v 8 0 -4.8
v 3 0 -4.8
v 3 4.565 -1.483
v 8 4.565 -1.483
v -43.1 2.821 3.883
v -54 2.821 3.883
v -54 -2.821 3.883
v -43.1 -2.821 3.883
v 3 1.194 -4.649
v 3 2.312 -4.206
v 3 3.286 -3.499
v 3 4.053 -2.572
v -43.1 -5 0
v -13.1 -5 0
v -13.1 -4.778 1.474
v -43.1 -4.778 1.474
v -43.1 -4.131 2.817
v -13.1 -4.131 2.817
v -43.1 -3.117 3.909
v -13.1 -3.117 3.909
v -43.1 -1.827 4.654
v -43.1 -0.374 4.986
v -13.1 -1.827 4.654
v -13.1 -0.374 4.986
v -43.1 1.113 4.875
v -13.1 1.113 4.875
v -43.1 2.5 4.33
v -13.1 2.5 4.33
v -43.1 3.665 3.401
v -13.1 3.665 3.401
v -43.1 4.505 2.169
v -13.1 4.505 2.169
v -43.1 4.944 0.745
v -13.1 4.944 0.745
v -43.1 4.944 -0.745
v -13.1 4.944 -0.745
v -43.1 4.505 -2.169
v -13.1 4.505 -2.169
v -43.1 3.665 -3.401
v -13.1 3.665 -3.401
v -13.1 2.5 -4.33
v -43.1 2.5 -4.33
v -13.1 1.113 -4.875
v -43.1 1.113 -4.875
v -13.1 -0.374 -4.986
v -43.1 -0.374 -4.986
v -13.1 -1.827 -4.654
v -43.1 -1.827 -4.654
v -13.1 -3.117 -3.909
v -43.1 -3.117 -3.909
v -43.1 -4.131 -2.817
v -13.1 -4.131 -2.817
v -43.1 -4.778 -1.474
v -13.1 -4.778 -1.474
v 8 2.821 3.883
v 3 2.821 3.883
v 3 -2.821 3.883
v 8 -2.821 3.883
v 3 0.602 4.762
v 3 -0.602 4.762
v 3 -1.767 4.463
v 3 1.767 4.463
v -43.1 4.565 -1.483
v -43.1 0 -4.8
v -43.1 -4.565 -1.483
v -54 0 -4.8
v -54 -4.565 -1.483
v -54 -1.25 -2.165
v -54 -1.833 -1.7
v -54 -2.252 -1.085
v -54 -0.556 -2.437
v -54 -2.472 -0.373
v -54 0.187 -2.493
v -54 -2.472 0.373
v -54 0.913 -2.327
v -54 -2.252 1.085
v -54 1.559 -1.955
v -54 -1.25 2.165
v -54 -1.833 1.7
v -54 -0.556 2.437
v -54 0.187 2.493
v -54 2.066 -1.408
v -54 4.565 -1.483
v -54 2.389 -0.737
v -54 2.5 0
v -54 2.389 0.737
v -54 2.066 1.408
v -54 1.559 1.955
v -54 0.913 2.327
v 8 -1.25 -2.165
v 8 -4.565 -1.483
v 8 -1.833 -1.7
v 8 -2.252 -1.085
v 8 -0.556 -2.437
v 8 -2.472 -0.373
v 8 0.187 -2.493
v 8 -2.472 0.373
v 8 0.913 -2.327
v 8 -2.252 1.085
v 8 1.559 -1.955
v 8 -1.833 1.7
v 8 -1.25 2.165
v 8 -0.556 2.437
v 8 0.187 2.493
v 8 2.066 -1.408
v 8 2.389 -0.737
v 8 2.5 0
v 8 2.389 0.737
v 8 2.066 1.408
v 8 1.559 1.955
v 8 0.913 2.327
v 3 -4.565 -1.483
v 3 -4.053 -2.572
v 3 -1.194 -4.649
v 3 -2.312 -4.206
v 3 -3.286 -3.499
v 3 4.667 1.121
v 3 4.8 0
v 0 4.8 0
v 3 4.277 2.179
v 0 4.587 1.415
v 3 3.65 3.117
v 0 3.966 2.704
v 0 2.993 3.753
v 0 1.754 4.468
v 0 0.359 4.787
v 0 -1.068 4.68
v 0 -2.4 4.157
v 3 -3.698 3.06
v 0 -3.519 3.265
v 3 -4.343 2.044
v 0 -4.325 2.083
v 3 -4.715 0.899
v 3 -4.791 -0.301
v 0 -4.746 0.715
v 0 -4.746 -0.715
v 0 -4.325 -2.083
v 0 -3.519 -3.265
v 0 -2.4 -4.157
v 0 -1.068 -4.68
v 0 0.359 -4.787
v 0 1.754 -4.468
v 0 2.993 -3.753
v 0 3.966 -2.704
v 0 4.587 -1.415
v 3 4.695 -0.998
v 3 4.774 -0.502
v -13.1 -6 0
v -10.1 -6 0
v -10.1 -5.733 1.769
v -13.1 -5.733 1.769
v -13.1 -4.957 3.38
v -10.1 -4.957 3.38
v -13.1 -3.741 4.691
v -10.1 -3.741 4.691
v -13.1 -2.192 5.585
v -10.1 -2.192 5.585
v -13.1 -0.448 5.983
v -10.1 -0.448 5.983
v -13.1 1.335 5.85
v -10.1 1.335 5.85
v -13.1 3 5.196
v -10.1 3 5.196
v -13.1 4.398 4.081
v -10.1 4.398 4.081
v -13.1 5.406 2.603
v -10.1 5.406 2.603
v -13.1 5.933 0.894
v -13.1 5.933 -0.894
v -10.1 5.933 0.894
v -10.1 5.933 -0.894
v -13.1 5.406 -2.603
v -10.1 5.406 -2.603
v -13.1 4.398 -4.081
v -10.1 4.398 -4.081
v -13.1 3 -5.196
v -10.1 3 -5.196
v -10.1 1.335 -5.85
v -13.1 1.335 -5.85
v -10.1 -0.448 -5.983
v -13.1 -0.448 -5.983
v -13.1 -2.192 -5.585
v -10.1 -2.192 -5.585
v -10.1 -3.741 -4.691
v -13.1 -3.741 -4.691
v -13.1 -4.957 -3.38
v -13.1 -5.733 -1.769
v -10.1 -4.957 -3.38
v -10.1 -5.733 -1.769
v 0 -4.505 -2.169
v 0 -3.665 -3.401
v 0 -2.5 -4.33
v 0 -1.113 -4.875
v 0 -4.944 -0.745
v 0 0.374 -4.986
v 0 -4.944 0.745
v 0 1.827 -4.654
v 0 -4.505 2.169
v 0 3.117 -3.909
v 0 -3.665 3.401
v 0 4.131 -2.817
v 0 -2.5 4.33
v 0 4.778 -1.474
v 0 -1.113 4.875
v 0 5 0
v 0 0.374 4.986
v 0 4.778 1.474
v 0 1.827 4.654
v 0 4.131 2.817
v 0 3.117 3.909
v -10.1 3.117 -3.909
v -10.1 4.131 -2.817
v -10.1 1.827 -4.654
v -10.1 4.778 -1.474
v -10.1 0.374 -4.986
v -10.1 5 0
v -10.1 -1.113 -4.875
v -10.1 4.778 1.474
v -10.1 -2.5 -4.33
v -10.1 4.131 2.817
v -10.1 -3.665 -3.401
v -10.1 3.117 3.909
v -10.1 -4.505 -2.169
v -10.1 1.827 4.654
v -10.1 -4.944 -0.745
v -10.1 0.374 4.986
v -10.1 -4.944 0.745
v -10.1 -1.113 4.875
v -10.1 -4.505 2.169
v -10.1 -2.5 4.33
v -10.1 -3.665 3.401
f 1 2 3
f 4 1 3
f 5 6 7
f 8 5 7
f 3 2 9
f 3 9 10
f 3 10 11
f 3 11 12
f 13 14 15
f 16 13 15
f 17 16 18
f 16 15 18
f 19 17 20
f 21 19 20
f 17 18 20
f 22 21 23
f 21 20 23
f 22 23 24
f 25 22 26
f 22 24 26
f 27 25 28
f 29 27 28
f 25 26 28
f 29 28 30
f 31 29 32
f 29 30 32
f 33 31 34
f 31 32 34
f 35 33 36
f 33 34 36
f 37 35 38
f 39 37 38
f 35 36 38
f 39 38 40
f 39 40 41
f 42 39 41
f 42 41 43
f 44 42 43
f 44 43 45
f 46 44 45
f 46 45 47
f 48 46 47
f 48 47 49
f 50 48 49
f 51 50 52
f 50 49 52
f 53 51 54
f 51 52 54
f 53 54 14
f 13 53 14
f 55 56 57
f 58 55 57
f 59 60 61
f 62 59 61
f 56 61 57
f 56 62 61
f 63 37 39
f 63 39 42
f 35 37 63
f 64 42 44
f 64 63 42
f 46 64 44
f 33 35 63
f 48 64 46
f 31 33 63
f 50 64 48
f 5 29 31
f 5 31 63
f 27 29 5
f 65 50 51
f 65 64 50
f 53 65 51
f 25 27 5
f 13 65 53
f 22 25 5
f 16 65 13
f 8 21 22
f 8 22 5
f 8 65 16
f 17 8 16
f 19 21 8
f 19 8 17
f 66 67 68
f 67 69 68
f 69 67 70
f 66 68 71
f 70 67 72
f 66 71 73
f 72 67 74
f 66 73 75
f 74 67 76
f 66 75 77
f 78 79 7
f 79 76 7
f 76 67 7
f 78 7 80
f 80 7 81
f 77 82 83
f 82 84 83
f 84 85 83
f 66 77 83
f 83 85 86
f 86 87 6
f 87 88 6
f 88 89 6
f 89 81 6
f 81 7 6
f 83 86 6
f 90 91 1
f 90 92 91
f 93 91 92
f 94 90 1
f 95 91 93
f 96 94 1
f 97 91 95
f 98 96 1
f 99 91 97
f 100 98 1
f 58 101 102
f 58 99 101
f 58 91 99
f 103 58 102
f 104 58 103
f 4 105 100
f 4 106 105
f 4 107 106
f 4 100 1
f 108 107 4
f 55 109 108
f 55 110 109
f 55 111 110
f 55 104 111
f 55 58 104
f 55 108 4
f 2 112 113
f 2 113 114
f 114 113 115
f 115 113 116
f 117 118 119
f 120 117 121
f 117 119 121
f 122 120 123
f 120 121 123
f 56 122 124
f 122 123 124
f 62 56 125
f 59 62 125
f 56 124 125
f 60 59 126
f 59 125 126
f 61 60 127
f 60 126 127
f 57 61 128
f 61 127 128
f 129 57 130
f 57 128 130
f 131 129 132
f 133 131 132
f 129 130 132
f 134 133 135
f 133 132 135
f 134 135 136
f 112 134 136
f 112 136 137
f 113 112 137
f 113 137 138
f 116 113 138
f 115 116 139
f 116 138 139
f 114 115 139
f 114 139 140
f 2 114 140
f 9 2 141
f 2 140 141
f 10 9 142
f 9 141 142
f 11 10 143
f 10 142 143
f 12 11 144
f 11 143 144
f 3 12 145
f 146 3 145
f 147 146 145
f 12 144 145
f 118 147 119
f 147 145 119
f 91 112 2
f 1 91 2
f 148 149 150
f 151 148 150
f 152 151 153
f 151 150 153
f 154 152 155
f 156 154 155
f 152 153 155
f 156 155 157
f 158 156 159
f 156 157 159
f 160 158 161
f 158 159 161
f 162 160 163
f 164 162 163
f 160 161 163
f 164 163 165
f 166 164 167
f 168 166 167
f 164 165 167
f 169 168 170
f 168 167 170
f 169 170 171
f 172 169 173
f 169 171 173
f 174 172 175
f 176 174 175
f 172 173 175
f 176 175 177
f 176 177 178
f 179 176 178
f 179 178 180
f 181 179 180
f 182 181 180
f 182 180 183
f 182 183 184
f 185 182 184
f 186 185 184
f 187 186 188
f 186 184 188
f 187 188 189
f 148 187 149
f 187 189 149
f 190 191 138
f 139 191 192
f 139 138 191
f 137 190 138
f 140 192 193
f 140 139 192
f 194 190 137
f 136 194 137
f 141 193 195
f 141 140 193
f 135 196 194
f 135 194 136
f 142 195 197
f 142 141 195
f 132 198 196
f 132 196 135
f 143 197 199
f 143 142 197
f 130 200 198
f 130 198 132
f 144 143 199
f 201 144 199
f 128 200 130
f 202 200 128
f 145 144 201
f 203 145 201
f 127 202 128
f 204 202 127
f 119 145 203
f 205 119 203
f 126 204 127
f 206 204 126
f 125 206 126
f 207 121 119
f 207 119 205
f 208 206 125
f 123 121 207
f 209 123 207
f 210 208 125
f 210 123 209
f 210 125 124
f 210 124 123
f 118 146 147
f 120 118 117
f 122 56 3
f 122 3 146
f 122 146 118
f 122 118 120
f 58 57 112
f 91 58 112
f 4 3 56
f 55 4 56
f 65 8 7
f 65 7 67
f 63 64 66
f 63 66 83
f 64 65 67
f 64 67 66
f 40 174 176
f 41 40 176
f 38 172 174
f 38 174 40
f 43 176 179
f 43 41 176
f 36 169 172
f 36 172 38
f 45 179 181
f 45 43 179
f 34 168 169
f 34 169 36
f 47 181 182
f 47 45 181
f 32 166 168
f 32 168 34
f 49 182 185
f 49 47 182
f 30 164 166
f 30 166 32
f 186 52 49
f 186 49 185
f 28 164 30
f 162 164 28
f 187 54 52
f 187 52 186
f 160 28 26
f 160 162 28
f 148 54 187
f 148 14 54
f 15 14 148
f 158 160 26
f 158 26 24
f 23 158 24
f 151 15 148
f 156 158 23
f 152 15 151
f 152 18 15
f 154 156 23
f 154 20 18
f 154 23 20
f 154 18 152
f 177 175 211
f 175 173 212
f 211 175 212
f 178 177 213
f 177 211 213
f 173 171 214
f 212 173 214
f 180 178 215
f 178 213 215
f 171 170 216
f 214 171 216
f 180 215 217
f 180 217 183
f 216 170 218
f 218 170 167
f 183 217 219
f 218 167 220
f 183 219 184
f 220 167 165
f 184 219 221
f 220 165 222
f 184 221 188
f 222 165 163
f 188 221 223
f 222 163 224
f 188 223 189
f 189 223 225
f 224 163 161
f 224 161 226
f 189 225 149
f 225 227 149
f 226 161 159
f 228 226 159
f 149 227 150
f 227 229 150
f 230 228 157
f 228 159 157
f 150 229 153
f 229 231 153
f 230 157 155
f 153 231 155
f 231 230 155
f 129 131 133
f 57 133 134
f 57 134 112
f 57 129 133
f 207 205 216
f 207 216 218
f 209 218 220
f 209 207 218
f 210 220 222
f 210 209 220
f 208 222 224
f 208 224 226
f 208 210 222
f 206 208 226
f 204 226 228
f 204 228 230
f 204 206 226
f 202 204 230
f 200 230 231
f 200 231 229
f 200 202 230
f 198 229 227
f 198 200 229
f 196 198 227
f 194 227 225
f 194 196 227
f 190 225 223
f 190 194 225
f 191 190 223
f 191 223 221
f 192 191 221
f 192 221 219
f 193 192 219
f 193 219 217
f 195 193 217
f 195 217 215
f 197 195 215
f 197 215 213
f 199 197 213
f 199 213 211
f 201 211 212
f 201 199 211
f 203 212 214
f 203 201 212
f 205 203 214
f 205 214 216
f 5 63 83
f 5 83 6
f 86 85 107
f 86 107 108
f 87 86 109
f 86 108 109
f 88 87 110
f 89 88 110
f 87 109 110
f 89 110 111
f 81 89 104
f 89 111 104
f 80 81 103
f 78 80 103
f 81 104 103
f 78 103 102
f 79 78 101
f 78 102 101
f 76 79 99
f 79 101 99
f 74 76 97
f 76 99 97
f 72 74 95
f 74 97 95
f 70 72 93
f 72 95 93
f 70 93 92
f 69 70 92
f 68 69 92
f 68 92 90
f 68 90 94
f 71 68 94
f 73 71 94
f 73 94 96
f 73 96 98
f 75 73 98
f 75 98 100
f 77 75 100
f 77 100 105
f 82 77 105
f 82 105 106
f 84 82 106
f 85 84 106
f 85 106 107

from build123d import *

# Parameters (mm, degrees)
F0_R          = 5
F1_DEPTH      = 10.1
F2_R          = 4.8
F3_DEPTH      = 3
F5_DEPTH      = 5
F5_DEPTH_BACK = 57
F6_R          = 6
F7_DEPTH      = 3
F8_R          = 5
F9_DEPTH      = 30
F10_R         = 2.5
F11_DEPTH     = 80


with BuildPart() as f1:
    # F0 (on Right) → F1 (new body)
    with BuildSketch(Plane.YZ):
        Circle(F0_R)
    extrude(amount=-F1_DEPTH)

    # F2 (on face) → F3 (join)
    with BuildSketch(Plane.YZ):
        Circle(F2_R)
    extrude(amount=F3_DEPTH)

    # F4 (on face) → F5 (join, two sides)
    with BuildSketch(Plane.YZ.offset(3)) as f5_sk:
        Polygon((-4.565071, -1.483282), (0, -4.8), (4.565071, -1.483282), (2.821369, 3.883282), (-2.821369, 3.883282), align=None)
    extrude(amount=F5_DEPTH)
    extrude(f5_sk.sketch, amount=-F5_DEPTH_BACK)

    # F6 (on face) → F7 (join)
    with BuildSketch(Plane(origin=(-10.1, 0, 0), x_dir=(0, -1, 0), z_dir=(-1, 0, 0))):
        Circle(F6_R)
    extrude(amount=F7_DEPTH)

    # F8 (on face) → F9 (join)
    with BuildSketch(Plane(origin=(-13.1, 0, 0), x_dir=(0, -1, 0), z_dir=(-1, 0, 0))):
        Circle(F8_R)
    extrude(amount=F9_DEPTH)

    # F10 (on face) → F11 (cut)
    with BuildSketch(Plane.YZ.offset(8)):
        Circle(F10_R)
    extrude(amount=-F11_DEPTH, mode=Mode.SUBTRACT)


solid = f1.part
